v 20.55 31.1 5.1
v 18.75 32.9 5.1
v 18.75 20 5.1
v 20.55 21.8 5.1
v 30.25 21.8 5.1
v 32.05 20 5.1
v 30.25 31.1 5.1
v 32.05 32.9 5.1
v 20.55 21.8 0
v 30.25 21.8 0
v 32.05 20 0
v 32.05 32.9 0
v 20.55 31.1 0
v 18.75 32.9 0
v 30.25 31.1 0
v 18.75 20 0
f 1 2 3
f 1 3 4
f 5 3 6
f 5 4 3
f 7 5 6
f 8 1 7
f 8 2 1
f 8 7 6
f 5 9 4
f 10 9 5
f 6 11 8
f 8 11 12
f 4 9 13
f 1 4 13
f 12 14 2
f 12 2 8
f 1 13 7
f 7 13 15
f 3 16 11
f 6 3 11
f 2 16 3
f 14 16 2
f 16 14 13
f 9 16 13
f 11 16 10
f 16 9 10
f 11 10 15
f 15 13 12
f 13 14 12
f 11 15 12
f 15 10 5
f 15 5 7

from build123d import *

# Parameters (mm, degrees)
BOX004_W     = 9.7
BOX004_H     = 9.3
BOX004_DEPTH = 5.1
BOX005_W     = 13.3
BOX005_H     = 12.9
BOX005_DEPTH = 5.1


with BuildPart() as cube004:
    # Box004 → Box004 (new body)
    with BuildSketch(Plane(origin=(1.8, 1.8, 0), x_dir=(1, 0, 0), z_dir=(0, 0, 1))):
        with Locations((4.85, 4.65)):
            Rectangle(BOX004_W, BOX004_H)
    extrude(amount=BOX004_DEPTH)


with BuildPart() as cut001:
    # Box005 → Box005 (new body)
    with BuildSketch(Plane.XY):
        with Locations((6.65, 6.45)):
            Rectangle(BOX005_W, BOX005_H)
    extrude(amount=BOX005_DEPTH)

    # Cut001: cut Cube004
    add(cube004.part, mode=Mode.SUBTRACT)


with BuildPart() as cut001_1:
    # Cut001 placement: moved
    add(cut001.part.moved(Location((18.75, 20, 0))))


solid = cut001_1.part
